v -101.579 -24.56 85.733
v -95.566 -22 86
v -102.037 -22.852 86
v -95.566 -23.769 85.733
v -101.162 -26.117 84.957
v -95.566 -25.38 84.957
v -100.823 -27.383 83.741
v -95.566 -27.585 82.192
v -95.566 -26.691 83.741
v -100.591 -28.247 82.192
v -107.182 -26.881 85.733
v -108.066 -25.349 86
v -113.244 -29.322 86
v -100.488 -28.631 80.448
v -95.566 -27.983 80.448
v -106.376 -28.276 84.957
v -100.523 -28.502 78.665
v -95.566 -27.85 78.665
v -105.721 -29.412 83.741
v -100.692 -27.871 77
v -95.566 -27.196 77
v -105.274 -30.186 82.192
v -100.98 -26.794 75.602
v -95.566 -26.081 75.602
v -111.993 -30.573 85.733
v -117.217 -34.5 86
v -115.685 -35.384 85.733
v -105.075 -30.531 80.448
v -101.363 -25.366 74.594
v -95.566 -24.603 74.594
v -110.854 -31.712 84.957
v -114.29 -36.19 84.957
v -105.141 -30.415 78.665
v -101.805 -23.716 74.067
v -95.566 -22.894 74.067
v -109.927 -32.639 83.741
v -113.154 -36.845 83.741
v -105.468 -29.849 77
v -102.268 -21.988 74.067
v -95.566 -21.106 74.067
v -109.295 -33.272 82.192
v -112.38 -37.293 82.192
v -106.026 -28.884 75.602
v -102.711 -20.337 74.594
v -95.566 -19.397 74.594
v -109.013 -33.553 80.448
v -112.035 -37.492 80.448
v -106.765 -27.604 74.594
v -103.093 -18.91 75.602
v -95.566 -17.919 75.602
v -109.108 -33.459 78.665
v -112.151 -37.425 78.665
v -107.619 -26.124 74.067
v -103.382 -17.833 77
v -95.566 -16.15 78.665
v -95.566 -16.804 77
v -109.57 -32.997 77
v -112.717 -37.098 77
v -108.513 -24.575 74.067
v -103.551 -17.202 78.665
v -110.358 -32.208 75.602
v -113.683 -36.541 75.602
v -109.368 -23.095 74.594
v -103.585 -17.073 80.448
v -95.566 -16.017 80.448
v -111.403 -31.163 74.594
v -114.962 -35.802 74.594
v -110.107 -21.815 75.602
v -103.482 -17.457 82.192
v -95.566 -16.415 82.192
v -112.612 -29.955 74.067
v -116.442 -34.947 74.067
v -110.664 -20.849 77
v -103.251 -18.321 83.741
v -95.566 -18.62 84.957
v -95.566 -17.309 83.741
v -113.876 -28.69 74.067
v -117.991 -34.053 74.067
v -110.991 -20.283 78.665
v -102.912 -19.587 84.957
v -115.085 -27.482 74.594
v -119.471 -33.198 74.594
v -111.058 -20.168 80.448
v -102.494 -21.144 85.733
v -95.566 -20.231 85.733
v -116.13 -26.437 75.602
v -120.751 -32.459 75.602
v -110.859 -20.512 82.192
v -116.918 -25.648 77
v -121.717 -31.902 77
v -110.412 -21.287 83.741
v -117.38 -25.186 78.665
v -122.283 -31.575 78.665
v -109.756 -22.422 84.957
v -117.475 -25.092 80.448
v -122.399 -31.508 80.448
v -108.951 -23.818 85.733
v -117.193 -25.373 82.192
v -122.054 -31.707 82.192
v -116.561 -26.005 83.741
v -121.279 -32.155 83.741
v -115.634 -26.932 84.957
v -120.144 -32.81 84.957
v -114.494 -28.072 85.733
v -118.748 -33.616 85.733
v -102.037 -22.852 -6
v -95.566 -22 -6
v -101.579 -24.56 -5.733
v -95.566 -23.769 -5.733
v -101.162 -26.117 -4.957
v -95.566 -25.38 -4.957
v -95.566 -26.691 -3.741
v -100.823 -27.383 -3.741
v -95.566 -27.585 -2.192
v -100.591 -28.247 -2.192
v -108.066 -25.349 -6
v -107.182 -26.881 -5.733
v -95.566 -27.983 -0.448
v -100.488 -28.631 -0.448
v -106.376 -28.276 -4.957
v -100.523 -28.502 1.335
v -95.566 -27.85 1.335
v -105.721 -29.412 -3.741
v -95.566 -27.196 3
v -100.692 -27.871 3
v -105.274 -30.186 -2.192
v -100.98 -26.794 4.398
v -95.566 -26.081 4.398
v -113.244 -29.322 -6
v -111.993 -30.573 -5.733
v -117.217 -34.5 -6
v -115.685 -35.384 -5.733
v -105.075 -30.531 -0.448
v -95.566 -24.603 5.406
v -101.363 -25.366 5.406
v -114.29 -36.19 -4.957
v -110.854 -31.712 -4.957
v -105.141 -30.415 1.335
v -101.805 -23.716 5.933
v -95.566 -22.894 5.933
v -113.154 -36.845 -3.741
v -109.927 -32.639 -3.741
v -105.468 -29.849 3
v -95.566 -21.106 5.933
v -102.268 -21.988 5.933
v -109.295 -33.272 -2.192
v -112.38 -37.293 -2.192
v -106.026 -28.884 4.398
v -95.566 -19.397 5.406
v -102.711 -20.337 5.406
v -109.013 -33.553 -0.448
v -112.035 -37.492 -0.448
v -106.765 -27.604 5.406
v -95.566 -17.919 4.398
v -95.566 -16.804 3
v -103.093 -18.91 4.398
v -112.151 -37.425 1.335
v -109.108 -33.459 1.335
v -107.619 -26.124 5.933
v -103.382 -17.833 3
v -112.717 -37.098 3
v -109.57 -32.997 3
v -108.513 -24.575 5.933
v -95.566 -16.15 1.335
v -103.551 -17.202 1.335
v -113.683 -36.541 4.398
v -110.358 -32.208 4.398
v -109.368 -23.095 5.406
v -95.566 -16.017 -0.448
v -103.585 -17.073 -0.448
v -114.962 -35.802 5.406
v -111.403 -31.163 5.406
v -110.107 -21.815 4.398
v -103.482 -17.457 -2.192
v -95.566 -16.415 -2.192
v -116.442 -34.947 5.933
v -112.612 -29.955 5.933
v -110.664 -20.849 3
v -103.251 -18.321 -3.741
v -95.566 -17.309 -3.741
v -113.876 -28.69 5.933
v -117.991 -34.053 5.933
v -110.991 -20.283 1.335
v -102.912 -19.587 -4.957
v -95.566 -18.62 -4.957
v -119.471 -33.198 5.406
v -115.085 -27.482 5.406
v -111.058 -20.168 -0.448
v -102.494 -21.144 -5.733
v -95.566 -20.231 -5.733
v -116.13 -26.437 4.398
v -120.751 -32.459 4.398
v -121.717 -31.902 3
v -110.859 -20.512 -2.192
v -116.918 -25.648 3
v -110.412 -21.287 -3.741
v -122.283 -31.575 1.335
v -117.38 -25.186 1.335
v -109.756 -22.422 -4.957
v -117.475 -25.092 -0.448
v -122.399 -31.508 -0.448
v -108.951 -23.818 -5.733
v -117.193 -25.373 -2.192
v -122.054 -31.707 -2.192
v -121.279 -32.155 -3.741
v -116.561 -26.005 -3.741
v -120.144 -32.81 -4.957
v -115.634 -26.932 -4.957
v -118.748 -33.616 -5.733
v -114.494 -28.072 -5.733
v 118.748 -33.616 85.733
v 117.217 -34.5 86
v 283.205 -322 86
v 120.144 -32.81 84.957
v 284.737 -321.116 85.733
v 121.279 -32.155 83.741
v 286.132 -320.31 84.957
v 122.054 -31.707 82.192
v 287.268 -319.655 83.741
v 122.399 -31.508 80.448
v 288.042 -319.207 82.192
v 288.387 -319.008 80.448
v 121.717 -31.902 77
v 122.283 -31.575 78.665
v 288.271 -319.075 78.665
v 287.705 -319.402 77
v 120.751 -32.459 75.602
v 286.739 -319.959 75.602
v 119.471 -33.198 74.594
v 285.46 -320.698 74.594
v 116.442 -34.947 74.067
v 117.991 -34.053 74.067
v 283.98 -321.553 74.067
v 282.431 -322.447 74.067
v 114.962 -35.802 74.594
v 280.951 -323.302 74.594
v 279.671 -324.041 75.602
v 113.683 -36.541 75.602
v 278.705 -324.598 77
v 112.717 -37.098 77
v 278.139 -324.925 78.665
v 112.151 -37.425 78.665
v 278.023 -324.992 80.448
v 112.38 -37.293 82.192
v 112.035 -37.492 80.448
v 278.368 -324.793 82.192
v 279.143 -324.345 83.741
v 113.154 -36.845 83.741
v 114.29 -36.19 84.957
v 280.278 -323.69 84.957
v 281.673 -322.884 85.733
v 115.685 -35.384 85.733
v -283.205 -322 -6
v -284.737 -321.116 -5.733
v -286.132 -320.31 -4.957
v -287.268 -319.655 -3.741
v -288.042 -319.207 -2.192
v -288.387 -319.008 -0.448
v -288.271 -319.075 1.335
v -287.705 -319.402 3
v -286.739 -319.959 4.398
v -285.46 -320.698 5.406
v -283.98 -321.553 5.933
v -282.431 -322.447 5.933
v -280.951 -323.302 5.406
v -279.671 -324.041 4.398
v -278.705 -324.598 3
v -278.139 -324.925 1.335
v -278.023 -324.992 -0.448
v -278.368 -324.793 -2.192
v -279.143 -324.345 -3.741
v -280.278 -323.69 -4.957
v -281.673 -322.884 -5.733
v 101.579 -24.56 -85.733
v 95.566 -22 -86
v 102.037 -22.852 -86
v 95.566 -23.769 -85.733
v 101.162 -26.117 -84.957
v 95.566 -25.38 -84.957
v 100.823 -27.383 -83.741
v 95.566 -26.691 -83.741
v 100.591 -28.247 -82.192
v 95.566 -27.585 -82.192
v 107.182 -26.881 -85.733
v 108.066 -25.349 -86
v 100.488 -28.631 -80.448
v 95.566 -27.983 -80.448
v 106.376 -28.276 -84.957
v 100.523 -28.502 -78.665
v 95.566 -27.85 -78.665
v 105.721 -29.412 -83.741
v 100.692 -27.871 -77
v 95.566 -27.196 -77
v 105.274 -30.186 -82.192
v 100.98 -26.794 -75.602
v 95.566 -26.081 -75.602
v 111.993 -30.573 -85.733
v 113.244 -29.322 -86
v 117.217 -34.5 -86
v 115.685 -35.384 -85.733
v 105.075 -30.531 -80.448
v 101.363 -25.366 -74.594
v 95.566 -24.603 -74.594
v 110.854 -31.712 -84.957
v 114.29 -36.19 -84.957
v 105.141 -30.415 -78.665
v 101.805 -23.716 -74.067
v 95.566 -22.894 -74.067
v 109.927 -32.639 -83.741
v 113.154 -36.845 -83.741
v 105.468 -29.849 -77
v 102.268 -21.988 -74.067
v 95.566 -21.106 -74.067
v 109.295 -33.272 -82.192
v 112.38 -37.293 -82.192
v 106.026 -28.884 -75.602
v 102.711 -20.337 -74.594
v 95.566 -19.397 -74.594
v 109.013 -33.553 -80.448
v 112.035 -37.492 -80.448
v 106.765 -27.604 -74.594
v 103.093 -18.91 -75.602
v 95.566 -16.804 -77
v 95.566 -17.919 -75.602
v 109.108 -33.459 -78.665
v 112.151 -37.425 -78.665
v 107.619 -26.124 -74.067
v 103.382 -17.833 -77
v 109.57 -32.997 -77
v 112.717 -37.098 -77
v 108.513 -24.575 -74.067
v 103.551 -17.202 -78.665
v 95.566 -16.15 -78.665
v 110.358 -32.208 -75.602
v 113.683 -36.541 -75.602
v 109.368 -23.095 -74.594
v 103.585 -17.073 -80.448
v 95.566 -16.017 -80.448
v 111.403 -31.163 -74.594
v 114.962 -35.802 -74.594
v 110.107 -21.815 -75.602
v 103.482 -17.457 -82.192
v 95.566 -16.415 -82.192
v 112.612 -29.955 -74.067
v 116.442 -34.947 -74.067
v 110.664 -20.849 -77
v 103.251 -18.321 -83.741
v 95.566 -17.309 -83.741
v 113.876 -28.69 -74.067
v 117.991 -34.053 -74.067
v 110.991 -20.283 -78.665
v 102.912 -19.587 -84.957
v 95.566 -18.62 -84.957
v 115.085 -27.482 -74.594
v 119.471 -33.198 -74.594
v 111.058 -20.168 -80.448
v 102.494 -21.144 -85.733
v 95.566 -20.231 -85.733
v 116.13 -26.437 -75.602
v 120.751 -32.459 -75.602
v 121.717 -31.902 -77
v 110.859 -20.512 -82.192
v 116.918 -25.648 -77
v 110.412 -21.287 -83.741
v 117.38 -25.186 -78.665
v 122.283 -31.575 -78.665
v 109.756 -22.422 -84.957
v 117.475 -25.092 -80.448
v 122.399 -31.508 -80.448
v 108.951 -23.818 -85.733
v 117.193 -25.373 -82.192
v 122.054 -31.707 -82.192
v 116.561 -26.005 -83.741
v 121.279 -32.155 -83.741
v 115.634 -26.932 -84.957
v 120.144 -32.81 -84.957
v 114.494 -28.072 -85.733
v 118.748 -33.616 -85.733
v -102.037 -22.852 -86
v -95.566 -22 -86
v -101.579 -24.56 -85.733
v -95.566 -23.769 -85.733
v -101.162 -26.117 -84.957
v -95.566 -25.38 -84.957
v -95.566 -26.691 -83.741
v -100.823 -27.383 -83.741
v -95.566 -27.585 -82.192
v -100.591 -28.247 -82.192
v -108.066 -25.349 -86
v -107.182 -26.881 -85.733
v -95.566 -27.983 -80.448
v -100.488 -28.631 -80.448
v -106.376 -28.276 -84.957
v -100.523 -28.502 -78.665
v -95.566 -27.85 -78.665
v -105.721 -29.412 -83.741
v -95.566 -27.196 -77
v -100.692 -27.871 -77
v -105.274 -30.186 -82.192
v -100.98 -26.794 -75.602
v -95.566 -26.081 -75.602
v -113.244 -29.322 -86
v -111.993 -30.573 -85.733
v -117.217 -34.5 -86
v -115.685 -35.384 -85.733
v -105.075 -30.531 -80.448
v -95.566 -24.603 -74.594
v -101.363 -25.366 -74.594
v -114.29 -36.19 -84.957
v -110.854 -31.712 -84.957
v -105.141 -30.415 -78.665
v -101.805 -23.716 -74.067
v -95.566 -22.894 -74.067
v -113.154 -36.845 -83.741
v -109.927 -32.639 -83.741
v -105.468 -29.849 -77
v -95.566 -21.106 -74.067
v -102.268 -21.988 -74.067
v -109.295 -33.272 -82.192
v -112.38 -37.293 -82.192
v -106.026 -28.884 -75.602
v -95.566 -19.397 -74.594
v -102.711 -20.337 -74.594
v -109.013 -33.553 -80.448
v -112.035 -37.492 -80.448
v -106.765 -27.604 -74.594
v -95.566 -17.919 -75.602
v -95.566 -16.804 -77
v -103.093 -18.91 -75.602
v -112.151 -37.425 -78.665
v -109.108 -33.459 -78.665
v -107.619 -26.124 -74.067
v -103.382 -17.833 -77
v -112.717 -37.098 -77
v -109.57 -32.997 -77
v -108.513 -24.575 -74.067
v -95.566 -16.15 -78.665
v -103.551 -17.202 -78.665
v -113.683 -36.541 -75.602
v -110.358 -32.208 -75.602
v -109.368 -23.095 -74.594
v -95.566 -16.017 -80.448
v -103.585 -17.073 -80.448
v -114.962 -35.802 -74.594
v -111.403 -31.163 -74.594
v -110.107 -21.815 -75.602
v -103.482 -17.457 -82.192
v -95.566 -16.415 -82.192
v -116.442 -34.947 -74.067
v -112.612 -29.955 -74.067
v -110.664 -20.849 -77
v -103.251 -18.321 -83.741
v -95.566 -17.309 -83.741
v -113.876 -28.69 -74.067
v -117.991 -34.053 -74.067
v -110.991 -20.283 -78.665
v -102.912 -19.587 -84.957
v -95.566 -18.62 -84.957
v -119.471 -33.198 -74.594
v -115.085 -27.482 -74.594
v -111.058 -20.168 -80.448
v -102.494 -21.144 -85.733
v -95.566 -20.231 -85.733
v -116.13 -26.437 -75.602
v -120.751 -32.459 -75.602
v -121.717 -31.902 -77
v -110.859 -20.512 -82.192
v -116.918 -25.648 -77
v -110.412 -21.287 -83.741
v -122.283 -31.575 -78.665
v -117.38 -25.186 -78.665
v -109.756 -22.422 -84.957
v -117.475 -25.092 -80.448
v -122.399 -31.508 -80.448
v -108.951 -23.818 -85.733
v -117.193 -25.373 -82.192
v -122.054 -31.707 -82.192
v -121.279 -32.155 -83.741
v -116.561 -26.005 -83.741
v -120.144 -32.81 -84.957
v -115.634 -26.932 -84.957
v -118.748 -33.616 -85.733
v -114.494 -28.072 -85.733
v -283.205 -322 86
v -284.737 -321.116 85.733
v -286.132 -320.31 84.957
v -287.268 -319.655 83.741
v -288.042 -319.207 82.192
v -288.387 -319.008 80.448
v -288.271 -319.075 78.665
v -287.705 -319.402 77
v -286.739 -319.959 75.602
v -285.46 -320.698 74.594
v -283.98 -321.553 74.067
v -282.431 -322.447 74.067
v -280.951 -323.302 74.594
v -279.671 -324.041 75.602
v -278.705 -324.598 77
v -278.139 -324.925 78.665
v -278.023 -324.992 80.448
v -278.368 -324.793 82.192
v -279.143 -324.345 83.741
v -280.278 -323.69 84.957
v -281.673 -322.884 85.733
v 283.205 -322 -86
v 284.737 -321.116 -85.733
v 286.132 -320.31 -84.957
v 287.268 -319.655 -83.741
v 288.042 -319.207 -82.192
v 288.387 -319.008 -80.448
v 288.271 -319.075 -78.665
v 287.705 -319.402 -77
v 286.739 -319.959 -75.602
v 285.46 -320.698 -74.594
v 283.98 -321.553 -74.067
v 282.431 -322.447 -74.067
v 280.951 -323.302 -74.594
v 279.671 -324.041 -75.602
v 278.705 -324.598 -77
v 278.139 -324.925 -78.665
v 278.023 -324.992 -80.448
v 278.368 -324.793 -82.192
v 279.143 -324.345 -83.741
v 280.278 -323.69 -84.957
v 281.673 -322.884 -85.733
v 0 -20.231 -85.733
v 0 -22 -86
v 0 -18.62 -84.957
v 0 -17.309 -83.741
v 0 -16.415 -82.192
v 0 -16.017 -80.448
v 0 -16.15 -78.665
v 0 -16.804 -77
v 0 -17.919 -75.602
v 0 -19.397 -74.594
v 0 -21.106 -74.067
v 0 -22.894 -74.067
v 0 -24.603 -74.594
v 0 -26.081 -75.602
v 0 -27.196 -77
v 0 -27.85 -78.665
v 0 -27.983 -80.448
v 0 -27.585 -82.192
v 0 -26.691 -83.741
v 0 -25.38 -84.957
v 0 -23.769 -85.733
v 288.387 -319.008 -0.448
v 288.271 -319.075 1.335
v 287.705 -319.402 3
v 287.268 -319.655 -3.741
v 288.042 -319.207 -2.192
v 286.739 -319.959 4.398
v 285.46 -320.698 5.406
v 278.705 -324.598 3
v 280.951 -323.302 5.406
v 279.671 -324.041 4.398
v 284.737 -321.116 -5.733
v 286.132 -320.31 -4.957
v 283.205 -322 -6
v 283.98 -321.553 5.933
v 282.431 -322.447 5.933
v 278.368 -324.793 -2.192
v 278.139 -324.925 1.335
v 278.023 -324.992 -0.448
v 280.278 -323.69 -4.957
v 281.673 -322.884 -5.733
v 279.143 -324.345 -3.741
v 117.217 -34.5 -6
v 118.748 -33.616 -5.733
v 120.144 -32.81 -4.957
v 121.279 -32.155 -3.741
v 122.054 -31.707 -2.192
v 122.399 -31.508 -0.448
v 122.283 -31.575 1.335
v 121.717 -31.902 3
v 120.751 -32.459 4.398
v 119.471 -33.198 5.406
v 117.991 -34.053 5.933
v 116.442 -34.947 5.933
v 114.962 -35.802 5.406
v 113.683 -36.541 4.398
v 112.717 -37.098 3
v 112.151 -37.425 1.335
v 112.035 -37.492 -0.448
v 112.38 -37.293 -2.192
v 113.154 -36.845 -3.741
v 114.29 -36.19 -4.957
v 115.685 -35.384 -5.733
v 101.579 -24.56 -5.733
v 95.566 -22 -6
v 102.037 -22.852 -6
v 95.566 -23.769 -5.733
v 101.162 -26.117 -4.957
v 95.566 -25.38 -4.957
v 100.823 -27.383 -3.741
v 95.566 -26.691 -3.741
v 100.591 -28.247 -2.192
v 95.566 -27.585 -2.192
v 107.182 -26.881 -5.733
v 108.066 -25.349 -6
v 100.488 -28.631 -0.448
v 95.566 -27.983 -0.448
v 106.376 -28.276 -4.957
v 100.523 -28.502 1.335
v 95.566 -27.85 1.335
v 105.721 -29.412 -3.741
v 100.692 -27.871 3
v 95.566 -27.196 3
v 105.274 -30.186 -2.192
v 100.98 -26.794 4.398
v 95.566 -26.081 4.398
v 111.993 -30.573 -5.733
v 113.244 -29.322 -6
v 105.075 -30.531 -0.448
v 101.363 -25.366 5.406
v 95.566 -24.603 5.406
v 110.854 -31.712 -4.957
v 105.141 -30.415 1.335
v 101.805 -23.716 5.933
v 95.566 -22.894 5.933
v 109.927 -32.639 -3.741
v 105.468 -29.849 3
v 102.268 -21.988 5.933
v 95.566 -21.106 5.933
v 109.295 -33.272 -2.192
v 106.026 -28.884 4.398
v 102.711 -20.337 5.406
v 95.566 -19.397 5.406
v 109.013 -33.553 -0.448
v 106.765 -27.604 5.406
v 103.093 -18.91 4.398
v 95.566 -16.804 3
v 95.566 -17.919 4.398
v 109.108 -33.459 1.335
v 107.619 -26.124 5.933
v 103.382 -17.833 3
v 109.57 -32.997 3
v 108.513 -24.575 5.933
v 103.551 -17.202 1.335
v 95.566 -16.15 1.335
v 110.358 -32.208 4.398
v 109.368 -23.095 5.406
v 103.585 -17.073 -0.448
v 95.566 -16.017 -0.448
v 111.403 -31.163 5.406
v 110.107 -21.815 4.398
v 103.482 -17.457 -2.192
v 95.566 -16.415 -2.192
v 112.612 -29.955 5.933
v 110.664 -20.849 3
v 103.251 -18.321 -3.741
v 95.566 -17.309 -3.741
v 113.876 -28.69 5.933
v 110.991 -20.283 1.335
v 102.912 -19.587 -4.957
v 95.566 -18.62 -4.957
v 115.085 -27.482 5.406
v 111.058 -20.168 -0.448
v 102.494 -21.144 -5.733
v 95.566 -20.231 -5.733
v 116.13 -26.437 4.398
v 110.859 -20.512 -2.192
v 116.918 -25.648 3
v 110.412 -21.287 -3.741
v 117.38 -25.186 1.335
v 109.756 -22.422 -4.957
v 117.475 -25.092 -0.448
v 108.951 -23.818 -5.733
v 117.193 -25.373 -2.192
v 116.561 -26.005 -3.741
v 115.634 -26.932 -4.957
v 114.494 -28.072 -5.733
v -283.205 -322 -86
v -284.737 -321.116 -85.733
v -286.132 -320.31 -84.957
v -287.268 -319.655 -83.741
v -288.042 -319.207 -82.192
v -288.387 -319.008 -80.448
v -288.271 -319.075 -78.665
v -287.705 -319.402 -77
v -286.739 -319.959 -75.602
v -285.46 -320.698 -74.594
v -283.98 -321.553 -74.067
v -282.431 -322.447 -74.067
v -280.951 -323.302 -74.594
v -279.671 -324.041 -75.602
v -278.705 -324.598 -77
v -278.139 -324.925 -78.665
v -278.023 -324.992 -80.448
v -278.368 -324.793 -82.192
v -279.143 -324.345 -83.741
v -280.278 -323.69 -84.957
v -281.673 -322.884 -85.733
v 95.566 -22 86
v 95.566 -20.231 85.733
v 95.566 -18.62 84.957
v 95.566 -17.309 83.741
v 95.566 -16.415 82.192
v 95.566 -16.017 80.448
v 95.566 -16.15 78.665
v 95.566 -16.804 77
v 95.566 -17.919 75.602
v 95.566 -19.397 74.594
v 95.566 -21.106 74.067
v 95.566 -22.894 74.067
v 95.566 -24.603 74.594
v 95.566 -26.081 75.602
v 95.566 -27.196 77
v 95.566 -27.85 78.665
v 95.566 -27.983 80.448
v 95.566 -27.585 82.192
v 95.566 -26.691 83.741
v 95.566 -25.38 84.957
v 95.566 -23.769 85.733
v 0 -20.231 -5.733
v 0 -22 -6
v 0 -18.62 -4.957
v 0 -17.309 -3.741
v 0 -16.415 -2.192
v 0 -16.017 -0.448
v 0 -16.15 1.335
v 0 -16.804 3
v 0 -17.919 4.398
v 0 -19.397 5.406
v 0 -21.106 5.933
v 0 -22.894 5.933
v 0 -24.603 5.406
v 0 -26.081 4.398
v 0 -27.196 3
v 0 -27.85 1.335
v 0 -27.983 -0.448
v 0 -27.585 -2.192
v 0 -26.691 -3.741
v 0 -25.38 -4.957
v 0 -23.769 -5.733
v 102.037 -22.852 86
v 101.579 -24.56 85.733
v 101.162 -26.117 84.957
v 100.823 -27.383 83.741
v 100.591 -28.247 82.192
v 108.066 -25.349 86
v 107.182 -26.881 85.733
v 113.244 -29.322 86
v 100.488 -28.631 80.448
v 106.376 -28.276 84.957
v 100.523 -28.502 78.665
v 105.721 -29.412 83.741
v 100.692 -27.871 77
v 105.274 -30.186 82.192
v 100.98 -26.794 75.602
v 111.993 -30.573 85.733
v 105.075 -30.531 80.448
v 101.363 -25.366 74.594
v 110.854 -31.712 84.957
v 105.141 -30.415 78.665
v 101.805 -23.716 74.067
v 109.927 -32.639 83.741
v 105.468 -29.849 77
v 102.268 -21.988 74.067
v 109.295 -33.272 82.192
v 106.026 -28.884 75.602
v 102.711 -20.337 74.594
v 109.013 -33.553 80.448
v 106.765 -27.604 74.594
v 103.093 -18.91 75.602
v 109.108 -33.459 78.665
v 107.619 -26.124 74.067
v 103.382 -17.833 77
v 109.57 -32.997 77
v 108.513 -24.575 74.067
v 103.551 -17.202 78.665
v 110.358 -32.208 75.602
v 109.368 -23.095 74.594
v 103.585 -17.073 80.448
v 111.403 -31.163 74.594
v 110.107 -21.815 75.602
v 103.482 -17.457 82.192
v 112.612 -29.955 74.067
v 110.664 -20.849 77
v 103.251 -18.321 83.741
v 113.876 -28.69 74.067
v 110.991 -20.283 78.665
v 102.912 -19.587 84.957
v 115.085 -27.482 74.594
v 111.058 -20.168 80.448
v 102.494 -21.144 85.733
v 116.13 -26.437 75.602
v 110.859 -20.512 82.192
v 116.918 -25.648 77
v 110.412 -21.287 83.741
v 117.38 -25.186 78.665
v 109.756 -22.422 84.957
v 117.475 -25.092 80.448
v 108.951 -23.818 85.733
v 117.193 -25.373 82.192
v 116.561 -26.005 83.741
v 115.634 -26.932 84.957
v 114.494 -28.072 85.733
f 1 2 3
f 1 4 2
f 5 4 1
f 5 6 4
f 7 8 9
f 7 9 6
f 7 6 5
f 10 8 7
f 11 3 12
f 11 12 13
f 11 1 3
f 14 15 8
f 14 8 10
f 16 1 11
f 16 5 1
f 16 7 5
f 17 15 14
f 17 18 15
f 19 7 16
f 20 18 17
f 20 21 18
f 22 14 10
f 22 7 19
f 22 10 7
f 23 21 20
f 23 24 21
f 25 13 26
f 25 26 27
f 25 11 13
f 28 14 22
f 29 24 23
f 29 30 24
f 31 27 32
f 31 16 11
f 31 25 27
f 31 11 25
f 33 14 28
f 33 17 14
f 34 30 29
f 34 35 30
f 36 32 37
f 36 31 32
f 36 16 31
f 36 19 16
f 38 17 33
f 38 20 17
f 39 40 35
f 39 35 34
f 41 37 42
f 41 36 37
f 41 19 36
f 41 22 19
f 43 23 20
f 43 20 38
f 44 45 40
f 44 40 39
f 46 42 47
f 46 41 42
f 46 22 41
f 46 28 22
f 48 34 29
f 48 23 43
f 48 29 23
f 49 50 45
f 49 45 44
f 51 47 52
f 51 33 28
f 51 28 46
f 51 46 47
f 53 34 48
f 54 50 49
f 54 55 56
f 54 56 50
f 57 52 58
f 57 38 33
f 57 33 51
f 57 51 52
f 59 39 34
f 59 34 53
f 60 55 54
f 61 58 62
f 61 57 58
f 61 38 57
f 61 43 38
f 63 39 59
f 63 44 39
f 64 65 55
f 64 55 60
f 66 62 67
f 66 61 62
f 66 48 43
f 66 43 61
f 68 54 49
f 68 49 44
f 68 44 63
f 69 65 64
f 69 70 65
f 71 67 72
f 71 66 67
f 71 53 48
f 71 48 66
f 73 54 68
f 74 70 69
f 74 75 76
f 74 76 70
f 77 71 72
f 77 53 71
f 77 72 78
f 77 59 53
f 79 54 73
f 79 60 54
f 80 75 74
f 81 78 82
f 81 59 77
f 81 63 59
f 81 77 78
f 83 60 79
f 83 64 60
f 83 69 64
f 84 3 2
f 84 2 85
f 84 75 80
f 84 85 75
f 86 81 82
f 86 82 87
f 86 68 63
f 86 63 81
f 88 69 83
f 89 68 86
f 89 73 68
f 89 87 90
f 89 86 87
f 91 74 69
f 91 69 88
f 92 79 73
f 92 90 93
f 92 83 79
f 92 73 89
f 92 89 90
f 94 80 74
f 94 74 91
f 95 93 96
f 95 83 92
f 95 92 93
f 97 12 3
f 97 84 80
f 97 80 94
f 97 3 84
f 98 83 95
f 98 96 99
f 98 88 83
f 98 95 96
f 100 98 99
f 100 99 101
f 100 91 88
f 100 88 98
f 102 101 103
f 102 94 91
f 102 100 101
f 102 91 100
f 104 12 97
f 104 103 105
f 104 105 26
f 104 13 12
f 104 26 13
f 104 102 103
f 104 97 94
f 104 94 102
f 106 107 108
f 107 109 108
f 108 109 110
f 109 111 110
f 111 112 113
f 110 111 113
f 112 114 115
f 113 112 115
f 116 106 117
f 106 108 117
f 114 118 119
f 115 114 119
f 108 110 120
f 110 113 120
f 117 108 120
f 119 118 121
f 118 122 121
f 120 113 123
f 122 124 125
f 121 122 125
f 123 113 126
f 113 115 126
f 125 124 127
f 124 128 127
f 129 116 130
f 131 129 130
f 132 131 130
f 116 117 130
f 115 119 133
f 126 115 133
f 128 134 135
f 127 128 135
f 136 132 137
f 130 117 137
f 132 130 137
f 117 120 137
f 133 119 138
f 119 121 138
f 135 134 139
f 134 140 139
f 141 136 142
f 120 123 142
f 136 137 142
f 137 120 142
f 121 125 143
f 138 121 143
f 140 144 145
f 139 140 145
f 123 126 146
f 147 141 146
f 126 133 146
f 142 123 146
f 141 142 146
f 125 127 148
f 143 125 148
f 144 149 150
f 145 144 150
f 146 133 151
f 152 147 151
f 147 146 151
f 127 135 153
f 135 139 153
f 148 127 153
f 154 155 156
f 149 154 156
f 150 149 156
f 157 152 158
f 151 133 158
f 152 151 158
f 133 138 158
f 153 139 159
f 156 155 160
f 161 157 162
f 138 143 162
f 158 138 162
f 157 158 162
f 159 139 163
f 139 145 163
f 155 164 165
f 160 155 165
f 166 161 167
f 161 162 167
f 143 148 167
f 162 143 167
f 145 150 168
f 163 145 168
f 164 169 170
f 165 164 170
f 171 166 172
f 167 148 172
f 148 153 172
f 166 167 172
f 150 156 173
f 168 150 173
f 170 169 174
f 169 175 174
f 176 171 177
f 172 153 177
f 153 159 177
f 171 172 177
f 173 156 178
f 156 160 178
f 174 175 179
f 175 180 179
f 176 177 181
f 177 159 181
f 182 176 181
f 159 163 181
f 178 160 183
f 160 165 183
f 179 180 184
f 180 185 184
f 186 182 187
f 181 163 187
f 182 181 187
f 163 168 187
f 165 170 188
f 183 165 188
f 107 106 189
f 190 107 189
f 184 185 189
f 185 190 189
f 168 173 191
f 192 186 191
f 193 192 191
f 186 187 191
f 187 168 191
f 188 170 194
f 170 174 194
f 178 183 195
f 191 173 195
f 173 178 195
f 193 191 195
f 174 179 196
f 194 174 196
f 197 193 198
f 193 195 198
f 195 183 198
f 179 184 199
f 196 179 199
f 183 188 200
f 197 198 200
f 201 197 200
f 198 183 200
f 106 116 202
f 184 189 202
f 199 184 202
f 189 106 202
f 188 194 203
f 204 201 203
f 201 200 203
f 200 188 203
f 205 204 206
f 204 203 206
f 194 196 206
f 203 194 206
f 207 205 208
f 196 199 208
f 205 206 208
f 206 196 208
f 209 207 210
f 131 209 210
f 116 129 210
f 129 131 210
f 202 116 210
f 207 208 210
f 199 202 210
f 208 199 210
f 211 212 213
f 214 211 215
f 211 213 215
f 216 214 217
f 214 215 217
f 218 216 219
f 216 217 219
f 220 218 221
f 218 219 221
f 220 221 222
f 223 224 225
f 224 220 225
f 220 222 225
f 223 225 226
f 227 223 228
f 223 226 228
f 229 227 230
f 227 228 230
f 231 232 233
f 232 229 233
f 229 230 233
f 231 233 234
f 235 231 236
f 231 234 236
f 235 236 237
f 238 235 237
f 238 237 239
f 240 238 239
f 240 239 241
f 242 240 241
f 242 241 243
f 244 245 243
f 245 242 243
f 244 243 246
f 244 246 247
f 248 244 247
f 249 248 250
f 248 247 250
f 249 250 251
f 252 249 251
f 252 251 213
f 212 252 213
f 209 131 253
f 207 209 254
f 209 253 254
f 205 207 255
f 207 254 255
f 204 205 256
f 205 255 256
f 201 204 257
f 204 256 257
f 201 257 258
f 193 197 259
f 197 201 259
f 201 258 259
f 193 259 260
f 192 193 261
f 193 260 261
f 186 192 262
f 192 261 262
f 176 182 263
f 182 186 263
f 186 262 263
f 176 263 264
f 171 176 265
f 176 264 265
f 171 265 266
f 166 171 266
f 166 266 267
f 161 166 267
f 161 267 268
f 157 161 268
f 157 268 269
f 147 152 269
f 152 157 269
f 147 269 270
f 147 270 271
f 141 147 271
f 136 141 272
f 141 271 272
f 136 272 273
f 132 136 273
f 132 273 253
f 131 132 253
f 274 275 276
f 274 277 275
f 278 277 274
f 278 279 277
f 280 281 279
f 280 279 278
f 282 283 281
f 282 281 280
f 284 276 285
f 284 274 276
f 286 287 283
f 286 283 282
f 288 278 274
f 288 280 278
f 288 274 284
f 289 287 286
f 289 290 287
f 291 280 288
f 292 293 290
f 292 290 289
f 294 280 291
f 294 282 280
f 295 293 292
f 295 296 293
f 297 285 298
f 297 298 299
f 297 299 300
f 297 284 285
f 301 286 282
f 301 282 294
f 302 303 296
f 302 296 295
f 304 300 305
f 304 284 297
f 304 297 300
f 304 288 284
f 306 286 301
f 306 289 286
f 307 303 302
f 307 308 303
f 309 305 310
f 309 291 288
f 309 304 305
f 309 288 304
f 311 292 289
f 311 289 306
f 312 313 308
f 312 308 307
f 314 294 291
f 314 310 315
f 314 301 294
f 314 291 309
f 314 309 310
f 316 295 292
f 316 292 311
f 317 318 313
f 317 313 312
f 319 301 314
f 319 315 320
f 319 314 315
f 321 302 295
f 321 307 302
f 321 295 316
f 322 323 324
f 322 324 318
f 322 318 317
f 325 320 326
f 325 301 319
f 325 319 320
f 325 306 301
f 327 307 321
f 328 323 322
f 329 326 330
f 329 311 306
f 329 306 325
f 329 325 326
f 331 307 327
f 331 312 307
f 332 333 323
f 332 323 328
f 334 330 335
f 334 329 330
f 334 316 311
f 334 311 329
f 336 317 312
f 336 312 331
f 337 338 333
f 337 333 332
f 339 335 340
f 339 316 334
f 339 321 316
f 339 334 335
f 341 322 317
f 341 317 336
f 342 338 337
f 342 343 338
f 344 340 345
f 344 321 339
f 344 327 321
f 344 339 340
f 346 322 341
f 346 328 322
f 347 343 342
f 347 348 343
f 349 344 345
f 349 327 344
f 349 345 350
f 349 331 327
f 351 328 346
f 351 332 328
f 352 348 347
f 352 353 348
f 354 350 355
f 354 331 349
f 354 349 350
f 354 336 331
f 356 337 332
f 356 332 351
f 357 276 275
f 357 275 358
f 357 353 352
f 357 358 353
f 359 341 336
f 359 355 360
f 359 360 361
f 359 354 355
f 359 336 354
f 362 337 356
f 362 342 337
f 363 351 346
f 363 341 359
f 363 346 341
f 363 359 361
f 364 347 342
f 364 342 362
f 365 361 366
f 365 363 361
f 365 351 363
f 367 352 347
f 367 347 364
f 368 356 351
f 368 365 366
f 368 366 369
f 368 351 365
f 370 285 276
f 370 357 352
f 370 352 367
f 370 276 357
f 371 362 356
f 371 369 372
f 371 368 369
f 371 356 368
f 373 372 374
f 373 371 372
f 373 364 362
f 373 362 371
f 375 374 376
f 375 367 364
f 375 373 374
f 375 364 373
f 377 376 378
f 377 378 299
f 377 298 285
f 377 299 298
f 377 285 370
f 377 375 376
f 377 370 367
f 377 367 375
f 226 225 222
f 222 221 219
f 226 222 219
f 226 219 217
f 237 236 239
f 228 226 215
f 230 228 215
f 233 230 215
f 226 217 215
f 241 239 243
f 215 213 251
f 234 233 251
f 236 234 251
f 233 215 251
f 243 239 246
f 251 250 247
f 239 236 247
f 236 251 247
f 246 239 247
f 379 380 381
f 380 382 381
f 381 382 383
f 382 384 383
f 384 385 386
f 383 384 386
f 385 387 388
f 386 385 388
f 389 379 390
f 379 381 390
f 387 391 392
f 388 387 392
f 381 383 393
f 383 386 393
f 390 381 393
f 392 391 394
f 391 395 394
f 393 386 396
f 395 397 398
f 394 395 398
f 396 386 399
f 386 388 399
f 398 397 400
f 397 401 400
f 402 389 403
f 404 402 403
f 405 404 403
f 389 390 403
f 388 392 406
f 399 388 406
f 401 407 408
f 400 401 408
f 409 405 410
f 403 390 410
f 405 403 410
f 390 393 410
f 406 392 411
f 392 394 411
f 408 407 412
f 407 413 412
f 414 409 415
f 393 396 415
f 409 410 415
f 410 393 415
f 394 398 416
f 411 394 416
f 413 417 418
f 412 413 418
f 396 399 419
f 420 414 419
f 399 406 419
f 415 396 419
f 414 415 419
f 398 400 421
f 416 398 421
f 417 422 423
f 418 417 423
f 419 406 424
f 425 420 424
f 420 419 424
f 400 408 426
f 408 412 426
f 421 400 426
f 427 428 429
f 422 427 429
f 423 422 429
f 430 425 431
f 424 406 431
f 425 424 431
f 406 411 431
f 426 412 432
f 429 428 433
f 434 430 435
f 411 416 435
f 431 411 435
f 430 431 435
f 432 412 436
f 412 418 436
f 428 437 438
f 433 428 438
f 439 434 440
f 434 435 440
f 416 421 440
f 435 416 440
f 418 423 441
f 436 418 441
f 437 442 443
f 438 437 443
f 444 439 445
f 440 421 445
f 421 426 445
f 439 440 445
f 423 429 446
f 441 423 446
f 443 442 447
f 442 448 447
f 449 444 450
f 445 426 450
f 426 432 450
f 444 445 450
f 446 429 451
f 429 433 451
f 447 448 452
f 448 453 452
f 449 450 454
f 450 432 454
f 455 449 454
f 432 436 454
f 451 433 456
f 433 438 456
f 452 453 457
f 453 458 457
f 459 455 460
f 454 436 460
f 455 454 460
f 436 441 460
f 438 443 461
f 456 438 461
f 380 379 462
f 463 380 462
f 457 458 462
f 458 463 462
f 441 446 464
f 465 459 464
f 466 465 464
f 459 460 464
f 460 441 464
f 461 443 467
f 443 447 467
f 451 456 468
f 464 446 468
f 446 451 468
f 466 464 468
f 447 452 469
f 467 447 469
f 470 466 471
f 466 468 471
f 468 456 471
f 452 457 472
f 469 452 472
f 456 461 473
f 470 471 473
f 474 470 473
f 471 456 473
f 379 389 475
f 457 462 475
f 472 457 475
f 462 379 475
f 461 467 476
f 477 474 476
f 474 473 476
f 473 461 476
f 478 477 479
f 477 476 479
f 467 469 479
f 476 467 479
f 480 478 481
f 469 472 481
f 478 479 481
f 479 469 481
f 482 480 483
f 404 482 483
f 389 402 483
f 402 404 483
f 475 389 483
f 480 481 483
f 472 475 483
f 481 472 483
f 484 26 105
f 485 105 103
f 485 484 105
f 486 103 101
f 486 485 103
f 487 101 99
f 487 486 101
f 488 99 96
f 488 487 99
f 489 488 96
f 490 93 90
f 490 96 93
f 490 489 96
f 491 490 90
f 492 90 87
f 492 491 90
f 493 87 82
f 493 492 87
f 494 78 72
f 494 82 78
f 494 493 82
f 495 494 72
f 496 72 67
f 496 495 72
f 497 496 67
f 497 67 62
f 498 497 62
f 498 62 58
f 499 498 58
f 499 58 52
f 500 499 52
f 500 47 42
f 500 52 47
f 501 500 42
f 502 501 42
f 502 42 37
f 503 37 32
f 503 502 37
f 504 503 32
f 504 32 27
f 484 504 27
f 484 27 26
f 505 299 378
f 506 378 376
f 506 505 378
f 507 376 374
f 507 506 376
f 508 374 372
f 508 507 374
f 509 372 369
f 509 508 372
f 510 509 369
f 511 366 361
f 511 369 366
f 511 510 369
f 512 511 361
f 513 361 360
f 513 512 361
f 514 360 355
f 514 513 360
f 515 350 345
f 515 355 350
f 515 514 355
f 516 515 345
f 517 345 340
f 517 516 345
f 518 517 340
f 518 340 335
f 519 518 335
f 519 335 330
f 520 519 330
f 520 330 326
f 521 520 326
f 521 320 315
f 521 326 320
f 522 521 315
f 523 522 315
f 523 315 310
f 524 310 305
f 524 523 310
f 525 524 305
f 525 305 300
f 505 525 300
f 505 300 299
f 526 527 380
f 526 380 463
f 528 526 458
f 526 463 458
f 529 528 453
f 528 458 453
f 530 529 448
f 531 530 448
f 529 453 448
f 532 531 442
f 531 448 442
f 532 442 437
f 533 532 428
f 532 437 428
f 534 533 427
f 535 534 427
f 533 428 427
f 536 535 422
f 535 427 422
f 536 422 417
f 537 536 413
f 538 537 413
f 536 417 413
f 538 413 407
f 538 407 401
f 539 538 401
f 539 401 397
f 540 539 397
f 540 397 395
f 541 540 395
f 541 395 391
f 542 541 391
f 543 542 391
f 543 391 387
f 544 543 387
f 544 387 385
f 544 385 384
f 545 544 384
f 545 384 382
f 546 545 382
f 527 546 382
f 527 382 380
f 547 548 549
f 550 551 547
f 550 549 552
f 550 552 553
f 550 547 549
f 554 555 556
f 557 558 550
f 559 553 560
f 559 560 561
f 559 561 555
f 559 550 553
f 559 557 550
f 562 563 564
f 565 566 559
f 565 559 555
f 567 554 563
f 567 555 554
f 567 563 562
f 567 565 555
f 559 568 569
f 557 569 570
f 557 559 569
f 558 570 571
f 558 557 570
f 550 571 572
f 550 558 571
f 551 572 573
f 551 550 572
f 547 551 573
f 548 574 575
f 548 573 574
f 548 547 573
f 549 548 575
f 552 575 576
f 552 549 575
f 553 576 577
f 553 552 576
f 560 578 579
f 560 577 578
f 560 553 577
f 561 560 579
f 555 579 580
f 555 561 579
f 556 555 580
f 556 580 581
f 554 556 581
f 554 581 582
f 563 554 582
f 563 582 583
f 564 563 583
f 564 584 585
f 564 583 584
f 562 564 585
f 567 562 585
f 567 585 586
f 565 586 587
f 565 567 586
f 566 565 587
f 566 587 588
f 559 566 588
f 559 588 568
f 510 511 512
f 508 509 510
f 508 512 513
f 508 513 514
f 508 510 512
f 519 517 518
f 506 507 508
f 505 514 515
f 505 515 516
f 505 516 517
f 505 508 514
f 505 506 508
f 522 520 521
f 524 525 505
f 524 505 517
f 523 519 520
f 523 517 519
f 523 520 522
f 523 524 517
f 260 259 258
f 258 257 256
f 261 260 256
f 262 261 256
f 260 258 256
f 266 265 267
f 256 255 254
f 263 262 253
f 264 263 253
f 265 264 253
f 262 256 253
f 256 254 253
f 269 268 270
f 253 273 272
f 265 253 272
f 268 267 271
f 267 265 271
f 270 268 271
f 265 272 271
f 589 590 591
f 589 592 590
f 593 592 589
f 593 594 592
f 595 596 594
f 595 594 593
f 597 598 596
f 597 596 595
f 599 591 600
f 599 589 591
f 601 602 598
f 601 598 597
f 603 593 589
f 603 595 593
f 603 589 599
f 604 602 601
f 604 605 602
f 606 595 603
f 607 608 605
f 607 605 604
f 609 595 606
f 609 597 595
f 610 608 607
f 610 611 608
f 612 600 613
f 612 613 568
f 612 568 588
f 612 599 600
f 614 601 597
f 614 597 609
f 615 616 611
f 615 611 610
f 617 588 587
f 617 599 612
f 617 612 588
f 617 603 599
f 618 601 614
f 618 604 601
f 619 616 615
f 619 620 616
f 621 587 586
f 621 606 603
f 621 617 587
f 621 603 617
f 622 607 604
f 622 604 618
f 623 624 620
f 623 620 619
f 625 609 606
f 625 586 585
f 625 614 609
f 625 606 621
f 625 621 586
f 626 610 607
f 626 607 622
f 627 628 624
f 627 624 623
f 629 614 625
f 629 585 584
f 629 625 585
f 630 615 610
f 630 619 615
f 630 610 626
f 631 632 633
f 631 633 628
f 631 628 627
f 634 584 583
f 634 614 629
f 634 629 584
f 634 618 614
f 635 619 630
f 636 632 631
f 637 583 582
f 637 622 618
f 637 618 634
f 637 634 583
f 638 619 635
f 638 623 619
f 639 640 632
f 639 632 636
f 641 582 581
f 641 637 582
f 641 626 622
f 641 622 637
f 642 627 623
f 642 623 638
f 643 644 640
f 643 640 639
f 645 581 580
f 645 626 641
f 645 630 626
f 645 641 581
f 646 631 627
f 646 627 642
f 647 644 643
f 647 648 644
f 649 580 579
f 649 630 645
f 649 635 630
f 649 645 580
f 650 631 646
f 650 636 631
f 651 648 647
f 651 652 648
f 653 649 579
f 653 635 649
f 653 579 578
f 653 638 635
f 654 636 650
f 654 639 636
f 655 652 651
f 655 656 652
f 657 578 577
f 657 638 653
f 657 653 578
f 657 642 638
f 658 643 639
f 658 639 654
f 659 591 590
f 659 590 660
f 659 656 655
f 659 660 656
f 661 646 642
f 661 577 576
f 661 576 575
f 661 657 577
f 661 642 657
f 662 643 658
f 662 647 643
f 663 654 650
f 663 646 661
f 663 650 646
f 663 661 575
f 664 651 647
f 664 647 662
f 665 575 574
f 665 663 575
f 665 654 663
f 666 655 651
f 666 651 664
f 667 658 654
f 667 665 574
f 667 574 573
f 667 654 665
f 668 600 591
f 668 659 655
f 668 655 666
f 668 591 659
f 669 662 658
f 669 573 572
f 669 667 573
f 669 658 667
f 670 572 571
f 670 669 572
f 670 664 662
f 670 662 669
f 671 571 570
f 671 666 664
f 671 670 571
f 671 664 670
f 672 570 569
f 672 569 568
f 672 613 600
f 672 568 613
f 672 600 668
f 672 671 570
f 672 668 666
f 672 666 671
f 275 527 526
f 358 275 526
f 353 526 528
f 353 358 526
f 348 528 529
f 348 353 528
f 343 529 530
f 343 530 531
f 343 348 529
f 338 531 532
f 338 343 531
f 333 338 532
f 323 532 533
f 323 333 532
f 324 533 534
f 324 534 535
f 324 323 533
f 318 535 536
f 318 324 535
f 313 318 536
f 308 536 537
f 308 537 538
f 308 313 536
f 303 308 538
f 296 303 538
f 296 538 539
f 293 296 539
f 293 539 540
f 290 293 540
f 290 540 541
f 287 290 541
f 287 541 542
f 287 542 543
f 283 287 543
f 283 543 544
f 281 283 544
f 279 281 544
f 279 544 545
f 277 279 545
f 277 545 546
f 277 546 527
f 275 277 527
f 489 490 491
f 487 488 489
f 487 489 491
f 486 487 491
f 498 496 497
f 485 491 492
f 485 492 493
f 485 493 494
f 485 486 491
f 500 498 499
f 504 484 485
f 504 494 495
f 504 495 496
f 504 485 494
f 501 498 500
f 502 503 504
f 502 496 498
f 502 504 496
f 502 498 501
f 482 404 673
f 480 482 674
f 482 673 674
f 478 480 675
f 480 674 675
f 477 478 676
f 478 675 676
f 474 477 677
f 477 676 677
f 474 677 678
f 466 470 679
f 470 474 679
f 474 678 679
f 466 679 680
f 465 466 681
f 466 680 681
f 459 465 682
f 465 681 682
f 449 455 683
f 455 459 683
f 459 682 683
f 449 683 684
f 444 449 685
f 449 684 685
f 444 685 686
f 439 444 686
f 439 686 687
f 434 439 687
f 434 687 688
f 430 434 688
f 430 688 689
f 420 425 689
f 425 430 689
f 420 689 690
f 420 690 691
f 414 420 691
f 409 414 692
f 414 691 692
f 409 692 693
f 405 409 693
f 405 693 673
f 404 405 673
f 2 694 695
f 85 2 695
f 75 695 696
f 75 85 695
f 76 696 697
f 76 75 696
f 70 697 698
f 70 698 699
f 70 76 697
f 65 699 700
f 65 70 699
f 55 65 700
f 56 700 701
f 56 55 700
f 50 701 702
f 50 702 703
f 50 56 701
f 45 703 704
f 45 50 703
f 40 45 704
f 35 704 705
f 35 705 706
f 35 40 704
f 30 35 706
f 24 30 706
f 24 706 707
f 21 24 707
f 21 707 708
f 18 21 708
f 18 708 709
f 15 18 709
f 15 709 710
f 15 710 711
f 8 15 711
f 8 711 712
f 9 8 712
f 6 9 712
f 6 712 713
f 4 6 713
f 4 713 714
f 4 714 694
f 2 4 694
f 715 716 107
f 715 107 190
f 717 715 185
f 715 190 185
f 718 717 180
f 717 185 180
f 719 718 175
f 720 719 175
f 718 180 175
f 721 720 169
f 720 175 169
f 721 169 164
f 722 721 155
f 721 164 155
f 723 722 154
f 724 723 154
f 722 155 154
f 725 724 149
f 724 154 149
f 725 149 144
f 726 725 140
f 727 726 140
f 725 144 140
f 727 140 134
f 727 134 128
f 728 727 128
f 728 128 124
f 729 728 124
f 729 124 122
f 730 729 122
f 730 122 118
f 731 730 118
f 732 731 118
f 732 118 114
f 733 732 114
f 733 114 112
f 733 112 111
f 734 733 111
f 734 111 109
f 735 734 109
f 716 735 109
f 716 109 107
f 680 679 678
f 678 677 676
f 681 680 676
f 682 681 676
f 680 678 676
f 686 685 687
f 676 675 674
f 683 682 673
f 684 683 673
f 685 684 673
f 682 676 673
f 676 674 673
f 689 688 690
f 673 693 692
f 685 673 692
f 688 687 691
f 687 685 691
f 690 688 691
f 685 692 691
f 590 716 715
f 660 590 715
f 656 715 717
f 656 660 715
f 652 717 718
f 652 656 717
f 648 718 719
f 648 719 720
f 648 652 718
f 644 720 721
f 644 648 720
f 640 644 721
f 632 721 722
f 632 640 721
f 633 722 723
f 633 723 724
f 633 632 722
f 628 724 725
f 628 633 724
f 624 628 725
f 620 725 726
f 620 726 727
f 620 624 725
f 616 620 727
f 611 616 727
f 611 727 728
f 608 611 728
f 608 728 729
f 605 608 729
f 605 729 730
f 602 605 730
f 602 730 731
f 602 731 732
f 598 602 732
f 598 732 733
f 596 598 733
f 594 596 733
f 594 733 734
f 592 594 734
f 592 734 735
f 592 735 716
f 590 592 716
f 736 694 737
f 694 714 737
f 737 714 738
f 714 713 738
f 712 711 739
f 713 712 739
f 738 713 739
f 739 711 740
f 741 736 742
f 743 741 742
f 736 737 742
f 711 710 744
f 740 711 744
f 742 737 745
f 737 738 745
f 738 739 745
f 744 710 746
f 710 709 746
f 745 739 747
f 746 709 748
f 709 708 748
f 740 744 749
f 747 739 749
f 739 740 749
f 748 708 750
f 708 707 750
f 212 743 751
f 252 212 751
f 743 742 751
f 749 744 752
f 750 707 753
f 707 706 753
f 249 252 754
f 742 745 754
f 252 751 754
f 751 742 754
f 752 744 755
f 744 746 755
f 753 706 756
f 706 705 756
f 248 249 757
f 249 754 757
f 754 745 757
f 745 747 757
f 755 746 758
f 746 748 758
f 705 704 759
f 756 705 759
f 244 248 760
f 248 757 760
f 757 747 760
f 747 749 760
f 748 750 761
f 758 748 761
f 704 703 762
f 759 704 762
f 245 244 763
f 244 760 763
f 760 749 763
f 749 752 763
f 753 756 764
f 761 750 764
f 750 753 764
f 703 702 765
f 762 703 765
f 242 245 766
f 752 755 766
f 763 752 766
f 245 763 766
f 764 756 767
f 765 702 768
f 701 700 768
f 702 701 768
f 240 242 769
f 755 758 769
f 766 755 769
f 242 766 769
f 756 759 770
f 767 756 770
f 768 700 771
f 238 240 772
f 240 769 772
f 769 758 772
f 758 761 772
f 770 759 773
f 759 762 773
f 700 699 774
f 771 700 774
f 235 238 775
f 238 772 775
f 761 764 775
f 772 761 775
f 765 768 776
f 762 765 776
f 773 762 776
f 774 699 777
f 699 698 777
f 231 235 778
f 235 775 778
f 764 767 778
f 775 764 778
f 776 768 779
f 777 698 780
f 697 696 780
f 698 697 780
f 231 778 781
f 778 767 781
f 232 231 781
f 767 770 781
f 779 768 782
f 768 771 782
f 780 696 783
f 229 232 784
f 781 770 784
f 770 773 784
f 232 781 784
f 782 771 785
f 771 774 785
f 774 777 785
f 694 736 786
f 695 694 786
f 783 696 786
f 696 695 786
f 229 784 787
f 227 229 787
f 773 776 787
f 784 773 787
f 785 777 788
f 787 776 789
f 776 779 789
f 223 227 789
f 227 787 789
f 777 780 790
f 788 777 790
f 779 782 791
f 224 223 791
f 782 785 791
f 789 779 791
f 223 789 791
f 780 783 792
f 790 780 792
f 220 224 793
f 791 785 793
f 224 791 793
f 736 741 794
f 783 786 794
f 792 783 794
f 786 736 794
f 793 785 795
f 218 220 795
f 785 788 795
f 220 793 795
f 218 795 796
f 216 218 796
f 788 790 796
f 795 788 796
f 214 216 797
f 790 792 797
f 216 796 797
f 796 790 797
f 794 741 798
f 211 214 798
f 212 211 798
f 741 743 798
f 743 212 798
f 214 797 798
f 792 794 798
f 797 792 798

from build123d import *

# Parameters (mm, degrees)
SKETCH_2_R             = 6
PATTERN_LINEAR_1_COUNT = 2
PATTERN_LINEAR_1_PITCH = 80


with BuildPart() as part:
    # По траектории1: sweep along a path in Эскиз3
    with BuildLine(Plane.XY) as sweep_1_path:
        Line((0, -22), (95.56624327, -22))
        ThreePointArc((95.56624327, -22), (108.06624327, -25.349364905), (117.216878365, -34.5))
        Line((117.216878365, -34.5), (283.205080757, -322))
    # Эскиз2 → По траектории1 (sweep)
    with BuildSketch(Plane(origin=(0, 0, 0), x_dir=(0, 0, -1), z_dir=(1, 0, 0))):
        with Locations((0, -22)):
            Circle(SKETCH_2_R)
    sweep_1 = sweep(path=sweep_1_path.line)

    # Зеркальное отражение1: По траектории1 across plane
    add(sweep_1.mirror(Plane(origin=(0, -22, 0), x_dir=(0, 0, 1), z_dir=(1, 0, 0))))


with BuildPart() as pattern_linear_1_1:
    # Линейный массив1: pattern copy
    add(part.part.moved(Location(Vector(0, 0, -1) * (1 * PATTERN_LINEAR_1_PITCH))))


with BuildPart() as body_3:
    # Зеркальное отражение2: mirrored copy
    add(pattern_linear_1_1.part.mirror(Plane.XY))


solid = Compound([part.part, pattern_linear_1_1.part, body_3.part])
